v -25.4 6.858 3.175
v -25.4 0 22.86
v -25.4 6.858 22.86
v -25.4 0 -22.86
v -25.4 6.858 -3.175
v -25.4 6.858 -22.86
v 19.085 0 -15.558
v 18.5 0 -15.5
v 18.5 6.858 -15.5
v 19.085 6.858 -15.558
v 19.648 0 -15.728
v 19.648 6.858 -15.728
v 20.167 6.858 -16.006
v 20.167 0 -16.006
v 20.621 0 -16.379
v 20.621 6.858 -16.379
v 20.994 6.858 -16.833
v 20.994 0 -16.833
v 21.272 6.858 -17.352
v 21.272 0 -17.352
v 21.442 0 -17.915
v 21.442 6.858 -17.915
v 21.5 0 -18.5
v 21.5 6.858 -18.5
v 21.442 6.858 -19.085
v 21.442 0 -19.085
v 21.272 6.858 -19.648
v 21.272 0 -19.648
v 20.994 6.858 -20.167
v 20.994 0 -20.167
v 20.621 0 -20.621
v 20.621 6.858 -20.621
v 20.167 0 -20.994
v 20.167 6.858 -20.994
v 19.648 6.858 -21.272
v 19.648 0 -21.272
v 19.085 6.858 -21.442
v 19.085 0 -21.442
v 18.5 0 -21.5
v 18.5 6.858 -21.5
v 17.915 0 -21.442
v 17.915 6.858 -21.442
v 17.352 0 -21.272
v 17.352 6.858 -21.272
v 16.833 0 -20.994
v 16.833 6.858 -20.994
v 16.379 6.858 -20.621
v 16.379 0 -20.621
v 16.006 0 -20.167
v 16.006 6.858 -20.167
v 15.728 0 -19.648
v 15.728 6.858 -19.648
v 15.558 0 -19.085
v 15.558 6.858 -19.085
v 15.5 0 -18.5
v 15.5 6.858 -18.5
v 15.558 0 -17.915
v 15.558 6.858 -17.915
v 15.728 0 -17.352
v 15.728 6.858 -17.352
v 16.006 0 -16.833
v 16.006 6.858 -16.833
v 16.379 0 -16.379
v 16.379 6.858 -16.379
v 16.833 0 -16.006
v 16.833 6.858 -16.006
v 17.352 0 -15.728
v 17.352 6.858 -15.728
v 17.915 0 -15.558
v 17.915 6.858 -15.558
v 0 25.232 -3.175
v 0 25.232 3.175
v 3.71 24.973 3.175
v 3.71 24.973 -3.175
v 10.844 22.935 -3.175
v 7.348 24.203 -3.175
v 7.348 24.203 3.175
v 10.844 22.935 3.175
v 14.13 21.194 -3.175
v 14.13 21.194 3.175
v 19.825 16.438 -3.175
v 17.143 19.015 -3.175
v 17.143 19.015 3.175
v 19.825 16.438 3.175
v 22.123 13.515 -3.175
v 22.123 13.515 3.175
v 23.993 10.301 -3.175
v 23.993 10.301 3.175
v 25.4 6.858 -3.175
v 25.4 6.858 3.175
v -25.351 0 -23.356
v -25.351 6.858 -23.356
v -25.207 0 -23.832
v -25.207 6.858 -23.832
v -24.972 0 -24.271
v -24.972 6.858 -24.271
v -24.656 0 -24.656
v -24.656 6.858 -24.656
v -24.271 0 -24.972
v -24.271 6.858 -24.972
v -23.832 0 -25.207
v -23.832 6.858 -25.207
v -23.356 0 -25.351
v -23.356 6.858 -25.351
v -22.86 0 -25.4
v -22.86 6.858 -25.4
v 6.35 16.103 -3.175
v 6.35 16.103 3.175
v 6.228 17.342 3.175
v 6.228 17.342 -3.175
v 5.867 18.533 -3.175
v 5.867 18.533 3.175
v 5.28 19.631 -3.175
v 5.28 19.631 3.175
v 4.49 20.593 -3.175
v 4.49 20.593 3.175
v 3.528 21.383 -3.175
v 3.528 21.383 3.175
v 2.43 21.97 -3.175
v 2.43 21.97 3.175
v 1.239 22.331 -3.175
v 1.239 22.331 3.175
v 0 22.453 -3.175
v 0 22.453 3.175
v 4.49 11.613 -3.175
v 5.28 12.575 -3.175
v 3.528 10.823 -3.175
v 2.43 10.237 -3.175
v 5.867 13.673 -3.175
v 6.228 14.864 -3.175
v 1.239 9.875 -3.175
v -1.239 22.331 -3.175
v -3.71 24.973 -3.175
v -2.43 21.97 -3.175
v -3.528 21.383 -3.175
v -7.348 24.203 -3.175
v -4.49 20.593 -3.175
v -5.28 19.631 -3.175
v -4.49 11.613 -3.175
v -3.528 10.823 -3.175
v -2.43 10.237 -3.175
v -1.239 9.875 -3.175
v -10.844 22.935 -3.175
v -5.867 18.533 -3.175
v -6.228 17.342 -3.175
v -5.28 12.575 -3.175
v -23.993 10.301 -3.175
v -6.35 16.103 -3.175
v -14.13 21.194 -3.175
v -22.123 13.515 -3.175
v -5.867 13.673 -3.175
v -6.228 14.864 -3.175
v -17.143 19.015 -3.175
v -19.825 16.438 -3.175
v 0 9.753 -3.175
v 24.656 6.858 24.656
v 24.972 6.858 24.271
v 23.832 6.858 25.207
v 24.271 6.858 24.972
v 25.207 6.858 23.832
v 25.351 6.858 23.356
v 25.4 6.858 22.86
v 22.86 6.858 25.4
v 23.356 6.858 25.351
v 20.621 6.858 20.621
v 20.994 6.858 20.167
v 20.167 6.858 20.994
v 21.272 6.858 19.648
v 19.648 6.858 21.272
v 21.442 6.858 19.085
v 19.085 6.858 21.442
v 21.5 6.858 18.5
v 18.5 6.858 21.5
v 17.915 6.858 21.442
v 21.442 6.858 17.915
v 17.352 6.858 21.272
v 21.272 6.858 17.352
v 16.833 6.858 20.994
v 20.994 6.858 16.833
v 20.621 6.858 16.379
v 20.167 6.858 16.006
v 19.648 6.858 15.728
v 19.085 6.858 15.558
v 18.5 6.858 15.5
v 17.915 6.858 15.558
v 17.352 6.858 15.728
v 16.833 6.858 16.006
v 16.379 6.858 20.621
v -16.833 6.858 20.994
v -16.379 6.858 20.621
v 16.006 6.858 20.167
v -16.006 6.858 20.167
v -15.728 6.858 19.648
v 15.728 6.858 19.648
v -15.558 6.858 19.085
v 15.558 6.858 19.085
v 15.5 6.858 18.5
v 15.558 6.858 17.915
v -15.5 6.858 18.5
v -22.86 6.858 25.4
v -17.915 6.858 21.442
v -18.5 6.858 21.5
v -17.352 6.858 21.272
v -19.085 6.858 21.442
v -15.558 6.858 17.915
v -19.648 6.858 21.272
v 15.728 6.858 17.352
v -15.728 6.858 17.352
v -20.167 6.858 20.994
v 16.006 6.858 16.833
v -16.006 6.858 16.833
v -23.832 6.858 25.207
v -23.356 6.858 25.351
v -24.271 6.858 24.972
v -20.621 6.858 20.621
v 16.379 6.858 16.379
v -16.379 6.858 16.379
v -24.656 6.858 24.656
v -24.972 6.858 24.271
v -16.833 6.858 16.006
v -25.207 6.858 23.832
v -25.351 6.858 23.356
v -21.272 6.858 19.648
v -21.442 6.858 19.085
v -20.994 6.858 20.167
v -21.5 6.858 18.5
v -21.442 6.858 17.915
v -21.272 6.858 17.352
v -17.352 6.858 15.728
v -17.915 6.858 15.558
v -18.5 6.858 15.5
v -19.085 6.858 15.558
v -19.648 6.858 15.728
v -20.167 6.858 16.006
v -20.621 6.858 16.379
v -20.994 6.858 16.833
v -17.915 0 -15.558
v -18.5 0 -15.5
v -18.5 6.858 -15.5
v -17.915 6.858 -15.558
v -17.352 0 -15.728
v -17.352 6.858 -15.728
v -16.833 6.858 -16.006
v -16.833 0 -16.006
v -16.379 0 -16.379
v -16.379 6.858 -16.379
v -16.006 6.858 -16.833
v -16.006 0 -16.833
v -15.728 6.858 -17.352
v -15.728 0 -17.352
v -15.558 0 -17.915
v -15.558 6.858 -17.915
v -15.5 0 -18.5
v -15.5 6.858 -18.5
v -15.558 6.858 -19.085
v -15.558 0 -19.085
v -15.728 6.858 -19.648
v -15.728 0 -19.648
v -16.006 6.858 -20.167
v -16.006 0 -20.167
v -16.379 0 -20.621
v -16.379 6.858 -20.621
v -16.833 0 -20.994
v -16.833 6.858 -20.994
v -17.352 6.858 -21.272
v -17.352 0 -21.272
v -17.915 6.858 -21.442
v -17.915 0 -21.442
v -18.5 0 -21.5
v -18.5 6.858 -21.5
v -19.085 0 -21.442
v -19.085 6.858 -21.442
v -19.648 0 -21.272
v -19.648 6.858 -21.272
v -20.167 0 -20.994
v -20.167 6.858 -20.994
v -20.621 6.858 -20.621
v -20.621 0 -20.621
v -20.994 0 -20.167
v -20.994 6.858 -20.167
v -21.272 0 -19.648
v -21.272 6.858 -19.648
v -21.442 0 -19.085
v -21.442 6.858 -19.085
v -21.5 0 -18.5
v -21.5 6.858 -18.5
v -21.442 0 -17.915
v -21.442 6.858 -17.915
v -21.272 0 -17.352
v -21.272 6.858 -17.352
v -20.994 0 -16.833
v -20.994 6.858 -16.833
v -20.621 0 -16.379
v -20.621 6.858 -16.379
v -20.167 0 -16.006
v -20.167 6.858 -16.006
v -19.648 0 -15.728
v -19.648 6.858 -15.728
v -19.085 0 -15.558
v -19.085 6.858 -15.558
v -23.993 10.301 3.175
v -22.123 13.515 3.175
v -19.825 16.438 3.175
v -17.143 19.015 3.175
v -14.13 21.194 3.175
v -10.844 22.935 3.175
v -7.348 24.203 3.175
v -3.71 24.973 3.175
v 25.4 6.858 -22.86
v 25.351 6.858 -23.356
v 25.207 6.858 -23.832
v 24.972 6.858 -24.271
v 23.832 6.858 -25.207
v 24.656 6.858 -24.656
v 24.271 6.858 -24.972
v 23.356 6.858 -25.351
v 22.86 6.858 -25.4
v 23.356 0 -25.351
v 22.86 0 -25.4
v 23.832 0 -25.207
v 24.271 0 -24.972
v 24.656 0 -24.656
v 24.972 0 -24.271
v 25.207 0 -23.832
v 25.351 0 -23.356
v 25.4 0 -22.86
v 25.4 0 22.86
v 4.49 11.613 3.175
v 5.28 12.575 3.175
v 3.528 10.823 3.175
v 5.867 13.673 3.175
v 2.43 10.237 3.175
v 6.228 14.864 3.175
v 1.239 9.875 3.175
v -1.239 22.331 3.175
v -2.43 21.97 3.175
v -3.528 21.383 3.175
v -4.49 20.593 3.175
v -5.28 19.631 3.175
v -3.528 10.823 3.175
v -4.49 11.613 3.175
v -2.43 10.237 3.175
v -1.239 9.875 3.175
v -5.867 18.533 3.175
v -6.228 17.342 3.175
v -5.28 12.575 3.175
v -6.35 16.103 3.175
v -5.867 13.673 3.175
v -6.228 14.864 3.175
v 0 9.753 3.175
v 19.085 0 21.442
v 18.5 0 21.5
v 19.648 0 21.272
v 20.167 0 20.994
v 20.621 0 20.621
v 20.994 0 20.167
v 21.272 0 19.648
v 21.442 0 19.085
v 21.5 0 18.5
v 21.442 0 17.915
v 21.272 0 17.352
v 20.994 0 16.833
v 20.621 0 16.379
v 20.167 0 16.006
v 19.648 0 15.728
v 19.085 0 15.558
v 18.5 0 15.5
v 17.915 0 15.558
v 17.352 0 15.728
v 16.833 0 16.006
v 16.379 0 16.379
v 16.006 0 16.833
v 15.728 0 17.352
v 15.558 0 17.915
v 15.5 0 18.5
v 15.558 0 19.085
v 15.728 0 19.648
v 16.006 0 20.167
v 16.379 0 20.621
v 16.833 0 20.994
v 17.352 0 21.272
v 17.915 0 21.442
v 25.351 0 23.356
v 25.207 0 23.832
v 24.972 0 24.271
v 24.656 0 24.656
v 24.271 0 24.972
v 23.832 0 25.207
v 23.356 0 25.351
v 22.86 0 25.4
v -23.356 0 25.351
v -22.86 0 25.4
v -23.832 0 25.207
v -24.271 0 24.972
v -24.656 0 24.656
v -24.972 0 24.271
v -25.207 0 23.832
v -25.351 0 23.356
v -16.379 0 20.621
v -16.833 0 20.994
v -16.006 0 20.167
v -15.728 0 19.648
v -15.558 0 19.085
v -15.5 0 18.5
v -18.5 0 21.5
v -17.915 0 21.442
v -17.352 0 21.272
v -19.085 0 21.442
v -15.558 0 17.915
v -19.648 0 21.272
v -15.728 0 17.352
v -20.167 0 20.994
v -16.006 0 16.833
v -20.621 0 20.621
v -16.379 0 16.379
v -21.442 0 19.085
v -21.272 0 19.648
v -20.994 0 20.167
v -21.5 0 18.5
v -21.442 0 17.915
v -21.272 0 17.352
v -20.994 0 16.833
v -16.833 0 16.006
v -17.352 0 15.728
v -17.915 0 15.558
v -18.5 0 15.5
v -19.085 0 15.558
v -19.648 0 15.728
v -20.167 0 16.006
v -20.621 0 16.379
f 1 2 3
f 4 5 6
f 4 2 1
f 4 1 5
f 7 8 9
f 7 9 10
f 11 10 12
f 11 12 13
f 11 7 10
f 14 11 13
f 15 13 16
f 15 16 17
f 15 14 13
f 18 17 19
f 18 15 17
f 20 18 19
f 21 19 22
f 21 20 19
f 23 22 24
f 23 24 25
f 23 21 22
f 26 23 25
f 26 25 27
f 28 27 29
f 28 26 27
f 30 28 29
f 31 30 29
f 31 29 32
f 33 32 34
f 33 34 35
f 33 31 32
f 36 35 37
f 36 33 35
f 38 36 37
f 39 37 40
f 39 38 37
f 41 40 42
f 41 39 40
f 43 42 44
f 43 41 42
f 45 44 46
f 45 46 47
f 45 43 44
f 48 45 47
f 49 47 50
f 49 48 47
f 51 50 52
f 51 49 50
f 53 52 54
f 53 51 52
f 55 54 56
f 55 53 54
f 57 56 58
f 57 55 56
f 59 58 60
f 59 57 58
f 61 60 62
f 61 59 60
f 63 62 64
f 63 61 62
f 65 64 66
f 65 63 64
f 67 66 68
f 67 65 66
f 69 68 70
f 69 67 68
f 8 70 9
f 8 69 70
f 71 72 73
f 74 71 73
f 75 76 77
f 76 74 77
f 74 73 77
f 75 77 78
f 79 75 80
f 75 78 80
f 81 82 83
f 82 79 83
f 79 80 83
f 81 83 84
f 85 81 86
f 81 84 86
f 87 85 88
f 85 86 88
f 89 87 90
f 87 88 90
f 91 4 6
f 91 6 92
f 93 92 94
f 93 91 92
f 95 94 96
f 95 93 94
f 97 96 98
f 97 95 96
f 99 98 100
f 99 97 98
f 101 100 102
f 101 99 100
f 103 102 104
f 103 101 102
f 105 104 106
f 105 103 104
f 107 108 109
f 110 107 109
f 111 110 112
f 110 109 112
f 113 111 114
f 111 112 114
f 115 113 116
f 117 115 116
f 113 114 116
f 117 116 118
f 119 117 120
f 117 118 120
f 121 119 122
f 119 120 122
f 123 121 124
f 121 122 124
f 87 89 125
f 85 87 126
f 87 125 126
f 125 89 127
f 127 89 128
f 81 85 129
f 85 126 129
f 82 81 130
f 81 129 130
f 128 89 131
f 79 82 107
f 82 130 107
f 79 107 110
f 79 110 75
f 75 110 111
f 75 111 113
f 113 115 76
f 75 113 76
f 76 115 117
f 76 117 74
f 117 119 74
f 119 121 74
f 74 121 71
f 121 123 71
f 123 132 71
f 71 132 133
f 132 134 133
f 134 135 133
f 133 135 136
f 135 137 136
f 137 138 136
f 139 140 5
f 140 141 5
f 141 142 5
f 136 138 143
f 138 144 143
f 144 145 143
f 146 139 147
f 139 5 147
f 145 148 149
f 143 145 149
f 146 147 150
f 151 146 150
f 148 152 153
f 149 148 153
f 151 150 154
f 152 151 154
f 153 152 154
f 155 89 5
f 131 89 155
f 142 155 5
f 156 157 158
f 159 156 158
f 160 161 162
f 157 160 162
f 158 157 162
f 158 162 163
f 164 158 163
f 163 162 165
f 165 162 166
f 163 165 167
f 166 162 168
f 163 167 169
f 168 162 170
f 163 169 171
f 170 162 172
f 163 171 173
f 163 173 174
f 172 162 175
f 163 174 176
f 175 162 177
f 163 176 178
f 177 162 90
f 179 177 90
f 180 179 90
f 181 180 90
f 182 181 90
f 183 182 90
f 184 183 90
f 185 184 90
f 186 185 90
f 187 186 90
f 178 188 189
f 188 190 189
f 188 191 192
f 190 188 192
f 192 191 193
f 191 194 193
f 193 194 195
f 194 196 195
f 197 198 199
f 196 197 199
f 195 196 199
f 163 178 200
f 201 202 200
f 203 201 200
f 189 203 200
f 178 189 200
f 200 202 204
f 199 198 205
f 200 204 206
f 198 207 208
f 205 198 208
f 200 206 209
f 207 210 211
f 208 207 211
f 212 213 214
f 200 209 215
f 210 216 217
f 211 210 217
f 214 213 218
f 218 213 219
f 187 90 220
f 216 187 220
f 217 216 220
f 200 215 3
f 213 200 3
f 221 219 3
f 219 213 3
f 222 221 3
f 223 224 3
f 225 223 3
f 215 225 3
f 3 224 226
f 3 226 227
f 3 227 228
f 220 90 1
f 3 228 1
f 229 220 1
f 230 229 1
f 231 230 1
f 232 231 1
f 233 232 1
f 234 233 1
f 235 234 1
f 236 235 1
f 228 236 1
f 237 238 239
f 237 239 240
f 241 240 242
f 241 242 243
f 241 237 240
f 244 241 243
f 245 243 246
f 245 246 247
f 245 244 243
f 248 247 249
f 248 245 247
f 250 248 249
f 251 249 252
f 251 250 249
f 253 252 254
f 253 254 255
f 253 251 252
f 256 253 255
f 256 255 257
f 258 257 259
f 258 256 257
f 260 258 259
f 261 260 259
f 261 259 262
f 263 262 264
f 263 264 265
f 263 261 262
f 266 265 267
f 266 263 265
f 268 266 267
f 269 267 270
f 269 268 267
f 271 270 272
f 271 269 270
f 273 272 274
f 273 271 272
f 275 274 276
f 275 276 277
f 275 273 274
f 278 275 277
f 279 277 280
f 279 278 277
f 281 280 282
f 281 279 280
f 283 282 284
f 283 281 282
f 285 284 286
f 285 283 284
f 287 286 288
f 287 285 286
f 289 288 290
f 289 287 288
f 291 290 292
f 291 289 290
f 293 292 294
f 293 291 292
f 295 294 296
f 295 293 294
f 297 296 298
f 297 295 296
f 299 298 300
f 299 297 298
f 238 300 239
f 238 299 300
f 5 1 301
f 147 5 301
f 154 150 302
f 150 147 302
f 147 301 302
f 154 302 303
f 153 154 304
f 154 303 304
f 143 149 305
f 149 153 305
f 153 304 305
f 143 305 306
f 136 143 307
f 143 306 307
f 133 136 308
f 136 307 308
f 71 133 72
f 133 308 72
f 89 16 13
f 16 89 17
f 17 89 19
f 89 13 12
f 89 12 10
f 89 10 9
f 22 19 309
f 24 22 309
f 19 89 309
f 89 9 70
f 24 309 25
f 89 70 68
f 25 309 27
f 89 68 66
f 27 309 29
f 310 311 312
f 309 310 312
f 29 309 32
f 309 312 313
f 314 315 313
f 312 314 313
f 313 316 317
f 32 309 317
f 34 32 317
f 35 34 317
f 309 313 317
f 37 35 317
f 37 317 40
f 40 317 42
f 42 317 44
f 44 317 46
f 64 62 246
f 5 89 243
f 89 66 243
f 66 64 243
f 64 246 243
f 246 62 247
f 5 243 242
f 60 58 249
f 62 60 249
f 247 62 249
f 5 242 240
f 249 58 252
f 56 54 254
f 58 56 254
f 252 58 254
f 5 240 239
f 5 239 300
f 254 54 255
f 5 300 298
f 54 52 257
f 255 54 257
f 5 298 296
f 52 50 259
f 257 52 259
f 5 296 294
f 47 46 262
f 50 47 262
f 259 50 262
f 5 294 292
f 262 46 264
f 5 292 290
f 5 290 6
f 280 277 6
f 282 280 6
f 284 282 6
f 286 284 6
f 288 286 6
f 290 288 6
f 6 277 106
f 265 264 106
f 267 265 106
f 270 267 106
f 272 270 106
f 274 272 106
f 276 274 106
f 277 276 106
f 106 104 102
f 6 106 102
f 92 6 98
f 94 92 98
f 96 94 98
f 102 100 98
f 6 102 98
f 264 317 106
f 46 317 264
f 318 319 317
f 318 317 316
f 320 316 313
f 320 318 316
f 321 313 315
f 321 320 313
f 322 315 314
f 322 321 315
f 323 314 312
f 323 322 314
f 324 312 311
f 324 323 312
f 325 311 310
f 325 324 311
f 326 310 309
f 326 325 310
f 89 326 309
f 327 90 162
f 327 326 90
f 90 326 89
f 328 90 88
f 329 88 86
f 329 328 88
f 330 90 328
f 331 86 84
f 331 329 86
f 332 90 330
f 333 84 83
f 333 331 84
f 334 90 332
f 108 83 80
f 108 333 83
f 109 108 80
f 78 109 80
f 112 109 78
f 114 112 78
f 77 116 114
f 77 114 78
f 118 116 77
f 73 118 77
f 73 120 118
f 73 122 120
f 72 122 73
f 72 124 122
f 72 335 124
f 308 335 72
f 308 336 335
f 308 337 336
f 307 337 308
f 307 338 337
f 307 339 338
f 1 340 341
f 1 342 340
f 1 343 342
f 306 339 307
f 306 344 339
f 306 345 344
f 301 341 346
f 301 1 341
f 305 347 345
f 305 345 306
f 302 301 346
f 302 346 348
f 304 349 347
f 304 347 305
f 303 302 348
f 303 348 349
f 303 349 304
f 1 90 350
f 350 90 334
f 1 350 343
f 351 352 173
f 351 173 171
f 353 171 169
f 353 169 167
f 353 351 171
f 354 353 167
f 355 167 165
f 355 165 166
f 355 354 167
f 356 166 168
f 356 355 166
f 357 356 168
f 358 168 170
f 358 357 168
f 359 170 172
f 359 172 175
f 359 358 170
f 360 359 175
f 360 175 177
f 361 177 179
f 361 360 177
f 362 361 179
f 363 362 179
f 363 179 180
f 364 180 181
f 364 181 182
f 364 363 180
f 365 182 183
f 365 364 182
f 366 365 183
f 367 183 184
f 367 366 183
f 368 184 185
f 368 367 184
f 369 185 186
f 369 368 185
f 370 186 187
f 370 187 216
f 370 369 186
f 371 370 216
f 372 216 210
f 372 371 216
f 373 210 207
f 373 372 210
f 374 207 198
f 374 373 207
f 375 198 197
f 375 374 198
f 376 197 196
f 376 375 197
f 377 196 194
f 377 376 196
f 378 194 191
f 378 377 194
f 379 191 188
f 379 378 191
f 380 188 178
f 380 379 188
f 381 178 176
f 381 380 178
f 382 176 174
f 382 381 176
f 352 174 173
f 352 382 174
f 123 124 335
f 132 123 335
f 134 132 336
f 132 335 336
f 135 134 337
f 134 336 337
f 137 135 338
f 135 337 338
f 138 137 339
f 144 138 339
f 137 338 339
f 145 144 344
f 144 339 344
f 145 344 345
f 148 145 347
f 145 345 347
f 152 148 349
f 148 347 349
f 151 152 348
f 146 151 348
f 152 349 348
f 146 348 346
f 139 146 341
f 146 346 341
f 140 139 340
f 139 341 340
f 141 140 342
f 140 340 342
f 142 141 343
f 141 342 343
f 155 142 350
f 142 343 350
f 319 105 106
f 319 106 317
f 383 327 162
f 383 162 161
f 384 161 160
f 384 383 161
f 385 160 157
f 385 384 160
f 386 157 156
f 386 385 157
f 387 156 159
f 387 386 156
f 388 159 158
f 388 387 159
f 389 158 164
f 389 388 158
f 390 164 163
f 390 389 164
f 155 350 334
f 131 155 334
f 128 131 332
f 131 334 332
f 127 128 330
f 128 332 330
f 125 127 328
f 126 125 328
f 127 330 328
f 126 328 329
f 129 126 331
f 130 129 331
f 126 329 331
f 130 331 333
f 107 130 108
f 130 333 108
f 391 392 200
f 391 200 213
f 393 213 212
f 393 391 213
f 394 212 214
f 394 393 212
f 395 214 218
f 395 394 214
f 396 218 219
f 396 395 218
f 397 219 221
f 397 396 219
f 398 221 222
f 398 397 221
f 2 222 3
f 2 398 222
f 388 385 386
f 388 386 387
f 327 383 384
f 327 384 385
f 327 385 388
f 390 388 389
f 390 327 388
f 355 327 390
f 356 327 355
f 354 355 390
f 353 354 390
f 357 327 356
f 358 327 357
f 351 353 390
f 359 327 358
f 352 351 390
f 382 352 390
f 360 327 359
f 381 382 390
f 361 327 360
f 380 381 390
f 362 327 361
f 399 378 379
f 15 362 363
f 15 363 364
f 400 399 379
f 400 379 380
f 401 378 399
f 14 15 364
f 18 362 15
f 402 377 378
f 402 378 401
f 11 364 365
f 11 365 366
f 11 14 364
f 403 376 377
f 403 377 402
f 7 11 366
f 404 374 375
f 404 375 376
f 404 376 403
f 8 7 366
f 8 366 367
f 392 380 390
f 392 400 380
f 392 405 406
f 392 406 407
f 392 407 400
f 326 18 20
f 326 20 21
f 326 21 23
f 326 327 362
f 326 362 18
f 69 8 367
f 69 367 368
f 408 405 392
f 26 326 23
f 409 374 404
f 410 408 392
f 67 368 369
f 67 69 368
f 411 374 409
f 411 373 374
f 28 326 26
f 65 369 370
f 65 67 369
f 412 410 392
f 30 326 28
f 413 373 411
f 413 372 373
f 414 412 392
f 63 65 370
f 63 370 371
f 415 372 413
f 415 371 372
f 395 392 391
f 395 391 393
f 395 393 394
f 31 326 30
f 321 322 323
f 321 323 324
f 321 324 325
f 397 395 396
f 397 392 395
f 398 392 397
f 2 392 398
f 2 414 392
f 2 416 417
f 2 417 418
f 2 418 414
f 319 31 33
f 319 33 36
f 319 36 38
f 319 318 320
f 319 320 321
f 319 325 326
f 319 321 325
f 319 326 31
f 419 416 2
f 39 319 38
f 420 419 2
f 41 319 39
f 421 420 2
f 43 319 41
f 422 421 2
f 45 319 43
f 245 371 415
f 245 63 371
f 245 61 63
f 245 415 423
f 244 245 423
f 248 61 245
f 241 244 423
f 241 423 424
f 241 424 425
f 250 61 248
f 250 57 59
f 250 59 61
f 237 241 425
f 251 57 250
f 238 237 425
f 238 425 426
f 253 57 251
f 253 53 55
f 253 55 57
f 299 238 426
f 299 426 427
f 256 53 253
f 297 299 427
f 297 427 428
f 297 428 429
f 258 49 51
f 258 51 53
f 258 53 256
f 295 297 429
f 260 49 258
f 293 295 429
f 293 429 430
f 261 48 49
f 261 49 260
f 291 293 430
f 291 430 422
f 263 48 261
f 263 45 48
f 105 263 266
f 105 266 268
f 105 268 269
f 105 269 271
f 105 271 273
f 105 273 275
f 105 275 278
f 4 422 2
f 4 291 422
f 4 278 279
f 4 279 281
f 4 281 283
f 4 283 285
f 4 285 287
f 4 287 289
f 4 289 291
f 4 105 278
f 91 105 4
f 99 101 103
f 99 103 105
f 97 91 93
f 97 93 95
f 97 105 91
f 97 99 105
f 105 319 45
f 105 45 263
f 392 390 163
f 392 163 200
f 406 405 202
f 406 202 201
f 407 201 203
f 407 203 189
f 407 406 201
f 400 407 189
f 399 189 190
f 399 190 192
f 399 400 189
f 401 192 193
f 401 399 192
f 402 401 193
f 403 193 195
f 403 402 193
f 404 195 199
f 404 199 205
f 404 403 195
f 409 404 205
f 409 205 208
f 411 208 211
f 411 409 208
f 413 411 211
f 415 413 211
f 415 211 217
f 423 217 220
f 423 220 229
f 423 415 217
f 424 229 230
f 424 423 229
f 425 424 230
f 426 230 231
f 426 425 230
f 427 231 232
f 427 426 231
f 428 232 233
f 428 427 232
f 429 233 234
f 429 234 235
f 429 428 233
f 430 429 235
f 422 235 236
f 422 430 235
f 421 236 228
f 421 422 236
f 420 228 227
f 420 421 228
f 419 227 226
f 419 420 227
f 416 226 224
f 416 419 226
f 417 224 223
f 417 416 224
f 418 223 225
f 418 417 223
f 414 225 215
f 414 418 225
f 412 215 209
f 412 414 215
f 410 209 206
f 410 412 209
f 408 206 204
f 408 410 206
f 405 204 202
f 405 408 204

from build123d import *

# Parameters (mm, degrees)
SKETCH1_R           = 2.999994
BOSS_EXTRUDE1_DEPTH = 6.858
SKETCH2_W           = 50.8
SKETCH2_H           = 19.05
BOSS_EXTRUDE2_DEPTH = 24.892
SKETCH3_R           = 6.35
CUT_EXTRUDE1_DEPTH  = 24.892
SKETCH4_W           = 6.35
SKETCH4_H           = 18.373928642
CUT_EXTRUDE2_DEPTH  = 58.166


with BuildPart() as part:
    # Sketch1 → Boss-Extrude1 (new body)
    with BuildSketch(Plane(origin=(0, 0, 0), x_dir=(1, 0, 0), z_dir=(0, 1, 0))):
        with BuildLine():
            Line((22.86, -25.4), (-22.86, -25.4))
            ThreePointArc((-22.86, -25.4), (-24.656051224, -24.656051224), (-25.4, -22.86))
            Line((-25.4, -22.86), (-25.4, 22.86))
            ThreePointArc((-25.4, 22.86), (-24.656051224, 24.656051224), (-22.86, 25.4))
            Line((-22.86, 25.4), (22.86, 25.4))
            ThreePointArc((22.86, 25.4), (24.656051224, 24.656051224), (25.4, 22.86))
            Line((25.4, 22.86), (25.4, -22.86))
            ThreePointArc((25.4, -22.86), (24.656051224, -24.656051224), (22.86, -25.4))
        make_face()
        with Locations((-18.499963, 18.499963)):
            Circle(SKETCH1_R, mode=Mode.SUBTRACT)
        with Locations((18.499963, 18.499963)):
            Circle(SKETCH1_R, mode=Mode.SUBTRACT)
        with Locations((18.499963, -18.499963)):
            Circle(SKETCH1_R, mode=Mode.SUBTRACT)
        with Locations((-18.499963, -18.499963)):
            Circle(SKETCH1_R, mode=Mode.SUBTRACT)
    extrude(amount=BOSS_EXTRUDE1_DEPTH)

    # Sketch2 → Boss-Extrude2 (add)
    with BuildSketch(Plane(origin=(0, 6.858, 0), x_dir=(1, 0, 0), z_dir=(0, 1, 0))):
        Rectangle(SKETCH2_W, SKETCH2_H)
    extrude(amount=BOSS_EXTRUDE2_DEPTH)

    # Sketch3 → Cut-Extrude1 (cut)
    with BuildSketch(Plane.XY.offset(9.525)):
        with BuildLine():
            Line((25.4, 31.75), (-25.4, 31.75))
            Line((-25.4, 31.75), (-25.4, 6.858))
            ThreePointArc((-25.4, 6.858), (0, 25.231928642), (25.4, 6.858))
            Line((25.4, 6.858), (25.4, 31.75))
        make_face()
        with Locations((0, 16.103217479)):
            Circle(SKETCH3_R)
    extrude(amount=-CUT_EXTRUDE1_DEPTH, mode=Mode.SUBTRACT)

    # Sketch4 → Cut-Extrude2 (cut)
    with BuildSketch(Plane.ZY.offset(25.4)):
        with Locations((-6.35, 16.044964321)):
            Rectangle(SKETCH4_W, SKETCH4_H)
        with Locations((6.35, 16.044964321)):
            Rectangle(SKETCH4_W, SKETCH4_H)
    extrude(amount=-CUT_EXTRUDE2_DEPTH, mode=Mode.SUBTRACT)


solid = part.part
